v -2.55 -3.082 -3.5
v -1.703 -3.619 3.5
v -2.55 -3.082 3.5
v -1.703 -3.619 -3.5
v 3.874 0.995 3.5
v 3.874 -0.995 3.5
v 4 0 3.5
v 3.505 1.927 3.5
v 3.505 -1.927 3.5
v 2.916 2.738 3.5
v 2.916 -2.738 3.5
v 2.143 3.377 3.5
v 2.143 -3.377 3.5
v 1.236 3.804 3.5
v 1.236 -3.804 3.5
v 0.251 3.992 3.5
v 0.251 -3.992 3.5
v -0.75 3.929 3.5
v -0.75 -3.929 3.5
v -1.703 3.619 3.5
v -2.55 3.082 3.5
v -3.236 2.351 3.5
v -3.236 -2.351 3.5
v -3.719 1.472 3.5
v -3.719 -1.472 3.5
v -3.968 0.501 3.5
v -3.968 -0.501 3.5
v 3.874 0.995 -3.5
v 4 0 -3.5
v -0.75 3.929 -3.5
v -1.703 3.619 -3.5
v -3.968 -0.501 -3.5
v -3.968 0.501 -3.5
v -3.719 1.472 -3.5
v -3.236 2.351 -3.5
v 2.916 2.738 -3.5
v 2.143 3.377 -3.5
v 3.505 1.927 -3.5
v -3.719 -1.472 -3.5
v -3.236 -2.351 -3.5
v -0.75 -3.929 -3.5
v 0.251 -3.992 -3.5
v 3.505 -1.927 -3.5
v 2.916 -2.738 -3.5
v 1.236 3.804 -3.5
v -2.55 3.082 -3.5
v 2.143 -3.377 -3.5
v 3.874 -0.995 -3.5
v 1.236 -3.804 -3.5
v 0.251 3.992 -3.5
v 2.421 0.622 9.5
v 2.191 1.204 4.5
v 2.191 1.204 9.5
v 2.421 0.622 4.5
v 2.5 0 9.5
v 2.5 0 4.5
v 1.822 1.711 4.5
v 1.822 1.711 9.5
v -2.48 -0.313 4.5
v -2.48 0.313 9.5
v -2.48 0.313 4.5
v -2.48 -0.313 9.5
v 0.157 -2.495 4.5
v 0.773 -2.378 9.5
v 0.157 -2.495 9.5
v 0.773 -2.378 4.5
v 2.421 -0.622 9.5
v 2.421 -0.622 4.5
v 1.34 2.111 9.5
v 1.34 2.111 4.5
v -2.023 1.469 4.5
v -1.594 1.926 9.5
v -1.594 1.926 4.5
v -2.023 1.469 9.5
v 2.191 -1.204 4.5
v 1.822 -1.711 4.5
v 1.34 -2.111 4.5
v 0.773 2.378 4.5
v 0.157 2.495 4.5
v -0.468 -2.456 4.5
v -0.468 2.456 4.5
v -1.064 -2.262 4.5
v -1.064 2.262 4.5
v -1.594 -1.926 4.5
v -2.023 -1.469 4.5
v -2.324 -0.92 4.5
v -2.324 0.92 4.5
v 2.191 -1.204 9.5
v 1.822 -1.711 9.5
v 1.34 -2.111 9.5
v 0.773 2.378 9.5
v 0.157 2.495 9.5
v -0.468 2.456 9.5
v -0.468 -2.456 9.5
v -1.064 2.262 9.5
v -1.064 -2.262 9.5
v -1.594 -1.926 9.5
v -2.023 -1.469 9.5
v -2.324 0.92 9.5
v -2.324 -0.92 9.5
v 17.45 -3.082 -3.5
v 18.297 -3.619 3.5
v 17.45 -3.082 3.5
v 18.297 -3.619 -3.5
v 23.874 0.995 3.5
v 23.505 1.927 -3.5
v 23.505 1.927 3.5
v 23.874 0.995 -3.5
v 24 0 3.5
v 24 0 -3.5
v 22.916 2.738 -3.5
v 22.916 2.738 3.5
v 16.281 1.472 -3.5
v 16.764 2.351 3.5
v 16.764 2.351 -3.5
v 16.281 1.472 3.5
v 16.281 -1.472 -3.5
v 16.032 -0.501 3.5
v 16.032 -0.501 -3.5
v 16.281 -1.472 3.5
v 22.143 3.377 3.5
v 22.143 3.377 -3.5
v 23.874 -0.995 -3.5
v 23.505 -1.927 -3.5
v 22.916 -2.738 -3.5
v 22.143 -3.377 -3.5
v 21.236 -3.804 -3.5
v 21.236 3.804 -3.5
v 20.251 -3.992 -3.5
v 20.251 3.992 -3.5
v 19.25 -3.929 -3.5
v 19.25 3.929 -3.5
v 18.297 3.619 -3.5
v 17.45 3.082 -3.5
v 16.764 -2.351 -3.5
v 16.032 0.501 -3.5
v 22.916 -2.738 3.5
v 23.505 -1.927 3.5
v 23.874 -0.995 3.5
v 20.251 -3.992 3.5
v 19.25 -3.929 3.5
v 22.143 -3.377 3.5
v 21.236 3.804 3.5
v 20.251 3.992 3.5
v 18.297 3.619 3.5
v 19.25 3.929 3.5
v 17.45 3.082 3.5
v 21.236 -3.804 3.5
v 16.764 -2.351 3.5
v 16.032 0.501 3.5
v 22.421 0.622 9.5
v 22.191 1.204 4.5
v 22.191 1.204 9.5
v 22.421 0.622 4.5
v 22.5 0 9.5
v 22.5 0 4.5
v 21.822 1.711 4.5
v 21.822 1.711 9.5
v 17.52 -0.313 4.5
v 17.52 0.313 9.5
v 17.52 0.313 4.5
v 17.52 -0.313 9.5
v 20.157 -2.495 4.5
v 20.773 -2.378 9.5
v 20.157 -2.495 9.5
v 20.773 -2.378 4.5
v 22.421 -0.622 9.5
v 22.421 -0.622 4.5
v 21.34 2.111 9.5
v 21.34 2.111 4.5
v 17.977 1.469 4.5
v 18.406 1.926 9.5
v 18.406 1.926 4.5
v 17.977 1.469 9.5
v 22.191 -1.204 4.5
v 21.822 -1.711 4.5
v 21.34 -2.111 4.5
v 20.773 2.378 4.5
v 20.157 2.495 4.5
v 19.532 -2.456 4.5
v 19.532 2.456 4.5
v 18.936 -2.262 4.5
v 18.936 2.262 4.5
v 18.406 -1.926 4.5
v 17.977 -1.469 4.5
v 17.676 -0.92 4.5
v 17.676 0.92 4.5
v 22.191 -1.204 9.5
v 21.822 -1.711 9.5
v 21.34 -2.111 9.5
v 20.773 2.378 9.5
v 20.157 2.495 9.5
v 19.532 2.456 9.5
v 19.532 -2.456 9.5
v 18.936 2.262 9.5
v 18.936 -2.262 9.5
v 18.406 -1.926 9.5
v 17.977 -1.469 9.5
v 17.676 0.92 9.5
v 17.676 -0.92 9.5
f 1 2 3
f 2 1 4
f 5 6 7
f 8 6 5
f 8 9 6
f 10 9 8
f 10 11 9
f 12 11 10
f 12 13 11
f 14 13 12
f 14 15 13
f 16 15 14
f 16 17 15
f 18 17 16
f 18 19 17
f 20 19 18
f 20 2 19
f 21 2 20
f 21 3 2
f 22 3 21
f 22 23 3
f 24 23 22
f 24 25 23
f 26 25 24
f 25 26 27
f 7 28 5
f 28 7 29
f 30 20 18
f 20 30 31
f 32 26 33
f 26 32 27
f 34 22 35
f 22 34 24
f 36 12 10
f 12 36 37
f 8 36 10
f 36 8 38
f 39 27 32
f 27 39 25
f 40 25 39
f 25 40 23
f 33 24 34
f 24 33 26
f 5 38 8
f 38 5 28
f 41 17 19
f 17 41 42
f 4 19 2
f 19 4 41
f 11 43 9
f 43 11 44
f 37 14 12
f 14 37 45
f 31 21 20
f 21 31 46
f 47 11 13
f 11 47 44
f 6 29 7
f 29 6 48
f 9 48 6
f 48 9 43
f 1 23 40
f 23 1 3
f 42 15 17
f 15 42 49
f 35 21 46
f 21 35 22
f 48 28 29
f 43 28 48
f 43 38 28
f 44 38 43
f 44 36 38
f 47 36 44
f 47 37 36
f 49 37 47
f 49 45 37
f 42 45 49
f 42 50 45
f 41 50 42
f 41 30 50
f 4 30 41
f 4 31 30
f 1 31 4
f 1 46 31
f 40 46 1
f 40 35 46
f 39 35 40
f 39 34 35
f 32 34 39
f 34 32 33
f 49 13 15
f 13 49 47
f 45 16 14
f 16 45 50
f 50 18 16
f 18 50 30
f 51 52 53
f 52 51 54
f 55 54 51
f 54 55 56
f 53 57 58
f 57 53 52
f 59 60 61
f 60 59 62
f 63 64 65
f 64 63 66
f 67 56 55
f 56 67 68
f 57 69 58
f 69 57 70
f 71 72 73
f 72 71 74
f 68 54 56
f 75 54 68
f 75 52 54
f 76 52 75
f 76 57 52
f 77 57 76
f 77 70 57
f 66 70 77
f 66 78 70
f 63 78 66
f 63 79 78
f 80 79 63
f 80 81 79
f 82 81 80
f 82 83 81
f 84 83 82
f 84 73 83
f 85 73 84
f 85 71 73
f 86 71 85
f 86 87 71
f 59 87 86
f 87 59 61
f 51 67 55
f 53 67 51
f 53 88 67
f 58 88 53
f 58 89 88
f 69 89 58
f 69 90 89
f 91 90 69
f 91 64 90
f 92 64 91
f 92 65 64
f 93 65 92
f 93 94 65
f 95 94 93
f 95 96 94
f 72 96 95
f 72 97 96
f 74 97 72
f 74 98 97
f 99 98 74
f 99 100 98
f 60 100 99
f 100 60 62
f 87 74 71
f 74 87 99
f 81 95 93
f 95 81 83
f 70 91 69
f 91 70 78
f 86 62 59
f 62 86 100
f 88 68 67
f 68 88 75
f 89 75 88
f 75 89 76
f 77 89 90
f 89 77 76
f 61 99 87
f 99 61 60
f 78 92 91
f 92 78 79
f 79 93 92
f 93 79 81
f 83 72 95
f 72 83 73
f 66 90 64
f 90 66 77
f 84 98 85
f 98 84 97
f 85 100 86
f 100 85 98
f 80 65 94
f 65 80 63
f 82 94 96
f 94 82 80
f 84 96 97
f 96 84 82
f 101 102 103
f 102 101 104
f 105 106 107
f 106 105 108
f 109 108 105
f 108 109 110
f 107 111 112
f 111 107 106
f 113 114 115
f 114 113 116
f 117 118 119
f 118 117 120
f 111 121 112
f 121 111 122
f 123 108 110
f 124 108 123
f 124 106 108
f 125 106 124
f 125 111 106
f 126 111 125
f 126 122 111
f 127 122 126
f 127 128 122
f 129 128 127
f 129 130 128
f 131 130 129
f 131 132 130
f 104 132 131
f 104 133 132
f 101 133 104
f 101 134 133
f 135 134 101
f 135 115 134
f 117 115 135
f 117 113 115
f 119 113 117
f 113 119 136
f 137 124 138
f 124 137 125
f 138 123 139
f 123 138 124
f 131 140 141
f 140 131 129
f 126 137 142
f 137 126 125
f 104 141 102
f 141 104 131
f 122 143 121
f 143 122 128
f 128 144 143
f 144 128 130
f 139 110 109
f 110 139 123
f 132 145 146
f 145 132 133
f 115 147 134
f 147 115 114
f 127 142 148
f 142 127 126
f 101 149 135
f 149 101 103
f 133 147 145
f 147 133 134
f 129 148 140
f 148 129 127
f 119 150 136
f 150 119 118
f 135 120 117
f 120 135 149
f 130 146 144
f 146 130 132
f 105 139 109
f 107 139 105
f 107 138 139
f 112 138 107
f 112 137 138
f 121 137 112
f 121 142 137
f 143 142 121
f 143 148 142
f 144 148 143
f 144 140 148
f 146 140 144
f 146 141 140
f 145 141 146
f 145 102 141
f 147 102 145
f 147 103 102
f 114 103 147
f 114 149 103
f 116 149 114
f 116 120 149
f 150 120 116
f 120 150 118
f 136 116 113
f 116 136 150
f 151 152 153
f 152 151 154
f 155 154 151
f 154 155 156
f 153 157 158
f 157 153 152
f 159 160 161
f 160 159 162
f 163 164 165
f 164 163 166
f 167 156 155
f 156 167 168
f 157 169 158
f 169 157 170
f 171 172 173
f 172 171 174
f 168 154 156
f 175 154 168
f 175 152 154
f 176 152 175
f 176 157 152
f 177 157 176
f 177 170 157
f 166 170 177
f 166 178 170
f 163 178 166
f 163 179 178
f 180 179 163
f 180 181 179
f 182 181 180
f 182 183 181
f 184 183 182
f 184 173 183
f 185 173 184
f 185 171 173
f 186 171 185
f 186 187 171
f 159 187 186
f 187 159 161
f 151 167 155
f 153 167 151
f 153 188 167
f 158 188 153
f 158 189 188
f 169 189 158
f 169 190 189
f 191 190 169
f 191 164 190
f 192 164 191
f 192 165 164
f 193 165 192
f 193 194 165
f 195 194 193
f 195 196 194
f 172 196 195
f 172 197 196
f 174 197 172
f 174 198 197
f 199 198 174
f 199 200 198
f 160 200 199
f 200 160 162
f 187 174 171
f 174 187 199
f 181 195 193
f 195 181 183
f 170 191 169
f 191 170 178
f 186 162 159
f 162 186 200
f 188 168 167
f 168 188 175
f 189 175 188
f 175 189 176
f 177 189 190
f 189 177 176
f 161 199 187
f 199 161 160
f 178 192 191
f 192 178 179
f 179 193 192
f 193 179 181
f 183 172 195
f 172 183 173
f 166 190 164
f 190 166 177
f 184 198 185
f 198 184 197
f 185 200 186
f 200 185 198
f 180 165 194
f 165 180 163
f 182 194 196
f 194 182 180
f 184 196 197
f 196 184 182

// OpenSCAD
module main() {
  union() {
  cylinder(h=7,r=4,center=true,$fn=25);
    translate([0,0,7]) {
      cylinder(h=5,r=2.5,center=true,$fn=25);
    }
  }
}

union() {
  main();
  translate([20,0,0]) {
    cylinder(h=7,r=4,center=true,$fn=25);
    translate([0,0,7]) {
      cylinder(h=5,r=2.5,center=true,$fn=25);
    }
  }
}
